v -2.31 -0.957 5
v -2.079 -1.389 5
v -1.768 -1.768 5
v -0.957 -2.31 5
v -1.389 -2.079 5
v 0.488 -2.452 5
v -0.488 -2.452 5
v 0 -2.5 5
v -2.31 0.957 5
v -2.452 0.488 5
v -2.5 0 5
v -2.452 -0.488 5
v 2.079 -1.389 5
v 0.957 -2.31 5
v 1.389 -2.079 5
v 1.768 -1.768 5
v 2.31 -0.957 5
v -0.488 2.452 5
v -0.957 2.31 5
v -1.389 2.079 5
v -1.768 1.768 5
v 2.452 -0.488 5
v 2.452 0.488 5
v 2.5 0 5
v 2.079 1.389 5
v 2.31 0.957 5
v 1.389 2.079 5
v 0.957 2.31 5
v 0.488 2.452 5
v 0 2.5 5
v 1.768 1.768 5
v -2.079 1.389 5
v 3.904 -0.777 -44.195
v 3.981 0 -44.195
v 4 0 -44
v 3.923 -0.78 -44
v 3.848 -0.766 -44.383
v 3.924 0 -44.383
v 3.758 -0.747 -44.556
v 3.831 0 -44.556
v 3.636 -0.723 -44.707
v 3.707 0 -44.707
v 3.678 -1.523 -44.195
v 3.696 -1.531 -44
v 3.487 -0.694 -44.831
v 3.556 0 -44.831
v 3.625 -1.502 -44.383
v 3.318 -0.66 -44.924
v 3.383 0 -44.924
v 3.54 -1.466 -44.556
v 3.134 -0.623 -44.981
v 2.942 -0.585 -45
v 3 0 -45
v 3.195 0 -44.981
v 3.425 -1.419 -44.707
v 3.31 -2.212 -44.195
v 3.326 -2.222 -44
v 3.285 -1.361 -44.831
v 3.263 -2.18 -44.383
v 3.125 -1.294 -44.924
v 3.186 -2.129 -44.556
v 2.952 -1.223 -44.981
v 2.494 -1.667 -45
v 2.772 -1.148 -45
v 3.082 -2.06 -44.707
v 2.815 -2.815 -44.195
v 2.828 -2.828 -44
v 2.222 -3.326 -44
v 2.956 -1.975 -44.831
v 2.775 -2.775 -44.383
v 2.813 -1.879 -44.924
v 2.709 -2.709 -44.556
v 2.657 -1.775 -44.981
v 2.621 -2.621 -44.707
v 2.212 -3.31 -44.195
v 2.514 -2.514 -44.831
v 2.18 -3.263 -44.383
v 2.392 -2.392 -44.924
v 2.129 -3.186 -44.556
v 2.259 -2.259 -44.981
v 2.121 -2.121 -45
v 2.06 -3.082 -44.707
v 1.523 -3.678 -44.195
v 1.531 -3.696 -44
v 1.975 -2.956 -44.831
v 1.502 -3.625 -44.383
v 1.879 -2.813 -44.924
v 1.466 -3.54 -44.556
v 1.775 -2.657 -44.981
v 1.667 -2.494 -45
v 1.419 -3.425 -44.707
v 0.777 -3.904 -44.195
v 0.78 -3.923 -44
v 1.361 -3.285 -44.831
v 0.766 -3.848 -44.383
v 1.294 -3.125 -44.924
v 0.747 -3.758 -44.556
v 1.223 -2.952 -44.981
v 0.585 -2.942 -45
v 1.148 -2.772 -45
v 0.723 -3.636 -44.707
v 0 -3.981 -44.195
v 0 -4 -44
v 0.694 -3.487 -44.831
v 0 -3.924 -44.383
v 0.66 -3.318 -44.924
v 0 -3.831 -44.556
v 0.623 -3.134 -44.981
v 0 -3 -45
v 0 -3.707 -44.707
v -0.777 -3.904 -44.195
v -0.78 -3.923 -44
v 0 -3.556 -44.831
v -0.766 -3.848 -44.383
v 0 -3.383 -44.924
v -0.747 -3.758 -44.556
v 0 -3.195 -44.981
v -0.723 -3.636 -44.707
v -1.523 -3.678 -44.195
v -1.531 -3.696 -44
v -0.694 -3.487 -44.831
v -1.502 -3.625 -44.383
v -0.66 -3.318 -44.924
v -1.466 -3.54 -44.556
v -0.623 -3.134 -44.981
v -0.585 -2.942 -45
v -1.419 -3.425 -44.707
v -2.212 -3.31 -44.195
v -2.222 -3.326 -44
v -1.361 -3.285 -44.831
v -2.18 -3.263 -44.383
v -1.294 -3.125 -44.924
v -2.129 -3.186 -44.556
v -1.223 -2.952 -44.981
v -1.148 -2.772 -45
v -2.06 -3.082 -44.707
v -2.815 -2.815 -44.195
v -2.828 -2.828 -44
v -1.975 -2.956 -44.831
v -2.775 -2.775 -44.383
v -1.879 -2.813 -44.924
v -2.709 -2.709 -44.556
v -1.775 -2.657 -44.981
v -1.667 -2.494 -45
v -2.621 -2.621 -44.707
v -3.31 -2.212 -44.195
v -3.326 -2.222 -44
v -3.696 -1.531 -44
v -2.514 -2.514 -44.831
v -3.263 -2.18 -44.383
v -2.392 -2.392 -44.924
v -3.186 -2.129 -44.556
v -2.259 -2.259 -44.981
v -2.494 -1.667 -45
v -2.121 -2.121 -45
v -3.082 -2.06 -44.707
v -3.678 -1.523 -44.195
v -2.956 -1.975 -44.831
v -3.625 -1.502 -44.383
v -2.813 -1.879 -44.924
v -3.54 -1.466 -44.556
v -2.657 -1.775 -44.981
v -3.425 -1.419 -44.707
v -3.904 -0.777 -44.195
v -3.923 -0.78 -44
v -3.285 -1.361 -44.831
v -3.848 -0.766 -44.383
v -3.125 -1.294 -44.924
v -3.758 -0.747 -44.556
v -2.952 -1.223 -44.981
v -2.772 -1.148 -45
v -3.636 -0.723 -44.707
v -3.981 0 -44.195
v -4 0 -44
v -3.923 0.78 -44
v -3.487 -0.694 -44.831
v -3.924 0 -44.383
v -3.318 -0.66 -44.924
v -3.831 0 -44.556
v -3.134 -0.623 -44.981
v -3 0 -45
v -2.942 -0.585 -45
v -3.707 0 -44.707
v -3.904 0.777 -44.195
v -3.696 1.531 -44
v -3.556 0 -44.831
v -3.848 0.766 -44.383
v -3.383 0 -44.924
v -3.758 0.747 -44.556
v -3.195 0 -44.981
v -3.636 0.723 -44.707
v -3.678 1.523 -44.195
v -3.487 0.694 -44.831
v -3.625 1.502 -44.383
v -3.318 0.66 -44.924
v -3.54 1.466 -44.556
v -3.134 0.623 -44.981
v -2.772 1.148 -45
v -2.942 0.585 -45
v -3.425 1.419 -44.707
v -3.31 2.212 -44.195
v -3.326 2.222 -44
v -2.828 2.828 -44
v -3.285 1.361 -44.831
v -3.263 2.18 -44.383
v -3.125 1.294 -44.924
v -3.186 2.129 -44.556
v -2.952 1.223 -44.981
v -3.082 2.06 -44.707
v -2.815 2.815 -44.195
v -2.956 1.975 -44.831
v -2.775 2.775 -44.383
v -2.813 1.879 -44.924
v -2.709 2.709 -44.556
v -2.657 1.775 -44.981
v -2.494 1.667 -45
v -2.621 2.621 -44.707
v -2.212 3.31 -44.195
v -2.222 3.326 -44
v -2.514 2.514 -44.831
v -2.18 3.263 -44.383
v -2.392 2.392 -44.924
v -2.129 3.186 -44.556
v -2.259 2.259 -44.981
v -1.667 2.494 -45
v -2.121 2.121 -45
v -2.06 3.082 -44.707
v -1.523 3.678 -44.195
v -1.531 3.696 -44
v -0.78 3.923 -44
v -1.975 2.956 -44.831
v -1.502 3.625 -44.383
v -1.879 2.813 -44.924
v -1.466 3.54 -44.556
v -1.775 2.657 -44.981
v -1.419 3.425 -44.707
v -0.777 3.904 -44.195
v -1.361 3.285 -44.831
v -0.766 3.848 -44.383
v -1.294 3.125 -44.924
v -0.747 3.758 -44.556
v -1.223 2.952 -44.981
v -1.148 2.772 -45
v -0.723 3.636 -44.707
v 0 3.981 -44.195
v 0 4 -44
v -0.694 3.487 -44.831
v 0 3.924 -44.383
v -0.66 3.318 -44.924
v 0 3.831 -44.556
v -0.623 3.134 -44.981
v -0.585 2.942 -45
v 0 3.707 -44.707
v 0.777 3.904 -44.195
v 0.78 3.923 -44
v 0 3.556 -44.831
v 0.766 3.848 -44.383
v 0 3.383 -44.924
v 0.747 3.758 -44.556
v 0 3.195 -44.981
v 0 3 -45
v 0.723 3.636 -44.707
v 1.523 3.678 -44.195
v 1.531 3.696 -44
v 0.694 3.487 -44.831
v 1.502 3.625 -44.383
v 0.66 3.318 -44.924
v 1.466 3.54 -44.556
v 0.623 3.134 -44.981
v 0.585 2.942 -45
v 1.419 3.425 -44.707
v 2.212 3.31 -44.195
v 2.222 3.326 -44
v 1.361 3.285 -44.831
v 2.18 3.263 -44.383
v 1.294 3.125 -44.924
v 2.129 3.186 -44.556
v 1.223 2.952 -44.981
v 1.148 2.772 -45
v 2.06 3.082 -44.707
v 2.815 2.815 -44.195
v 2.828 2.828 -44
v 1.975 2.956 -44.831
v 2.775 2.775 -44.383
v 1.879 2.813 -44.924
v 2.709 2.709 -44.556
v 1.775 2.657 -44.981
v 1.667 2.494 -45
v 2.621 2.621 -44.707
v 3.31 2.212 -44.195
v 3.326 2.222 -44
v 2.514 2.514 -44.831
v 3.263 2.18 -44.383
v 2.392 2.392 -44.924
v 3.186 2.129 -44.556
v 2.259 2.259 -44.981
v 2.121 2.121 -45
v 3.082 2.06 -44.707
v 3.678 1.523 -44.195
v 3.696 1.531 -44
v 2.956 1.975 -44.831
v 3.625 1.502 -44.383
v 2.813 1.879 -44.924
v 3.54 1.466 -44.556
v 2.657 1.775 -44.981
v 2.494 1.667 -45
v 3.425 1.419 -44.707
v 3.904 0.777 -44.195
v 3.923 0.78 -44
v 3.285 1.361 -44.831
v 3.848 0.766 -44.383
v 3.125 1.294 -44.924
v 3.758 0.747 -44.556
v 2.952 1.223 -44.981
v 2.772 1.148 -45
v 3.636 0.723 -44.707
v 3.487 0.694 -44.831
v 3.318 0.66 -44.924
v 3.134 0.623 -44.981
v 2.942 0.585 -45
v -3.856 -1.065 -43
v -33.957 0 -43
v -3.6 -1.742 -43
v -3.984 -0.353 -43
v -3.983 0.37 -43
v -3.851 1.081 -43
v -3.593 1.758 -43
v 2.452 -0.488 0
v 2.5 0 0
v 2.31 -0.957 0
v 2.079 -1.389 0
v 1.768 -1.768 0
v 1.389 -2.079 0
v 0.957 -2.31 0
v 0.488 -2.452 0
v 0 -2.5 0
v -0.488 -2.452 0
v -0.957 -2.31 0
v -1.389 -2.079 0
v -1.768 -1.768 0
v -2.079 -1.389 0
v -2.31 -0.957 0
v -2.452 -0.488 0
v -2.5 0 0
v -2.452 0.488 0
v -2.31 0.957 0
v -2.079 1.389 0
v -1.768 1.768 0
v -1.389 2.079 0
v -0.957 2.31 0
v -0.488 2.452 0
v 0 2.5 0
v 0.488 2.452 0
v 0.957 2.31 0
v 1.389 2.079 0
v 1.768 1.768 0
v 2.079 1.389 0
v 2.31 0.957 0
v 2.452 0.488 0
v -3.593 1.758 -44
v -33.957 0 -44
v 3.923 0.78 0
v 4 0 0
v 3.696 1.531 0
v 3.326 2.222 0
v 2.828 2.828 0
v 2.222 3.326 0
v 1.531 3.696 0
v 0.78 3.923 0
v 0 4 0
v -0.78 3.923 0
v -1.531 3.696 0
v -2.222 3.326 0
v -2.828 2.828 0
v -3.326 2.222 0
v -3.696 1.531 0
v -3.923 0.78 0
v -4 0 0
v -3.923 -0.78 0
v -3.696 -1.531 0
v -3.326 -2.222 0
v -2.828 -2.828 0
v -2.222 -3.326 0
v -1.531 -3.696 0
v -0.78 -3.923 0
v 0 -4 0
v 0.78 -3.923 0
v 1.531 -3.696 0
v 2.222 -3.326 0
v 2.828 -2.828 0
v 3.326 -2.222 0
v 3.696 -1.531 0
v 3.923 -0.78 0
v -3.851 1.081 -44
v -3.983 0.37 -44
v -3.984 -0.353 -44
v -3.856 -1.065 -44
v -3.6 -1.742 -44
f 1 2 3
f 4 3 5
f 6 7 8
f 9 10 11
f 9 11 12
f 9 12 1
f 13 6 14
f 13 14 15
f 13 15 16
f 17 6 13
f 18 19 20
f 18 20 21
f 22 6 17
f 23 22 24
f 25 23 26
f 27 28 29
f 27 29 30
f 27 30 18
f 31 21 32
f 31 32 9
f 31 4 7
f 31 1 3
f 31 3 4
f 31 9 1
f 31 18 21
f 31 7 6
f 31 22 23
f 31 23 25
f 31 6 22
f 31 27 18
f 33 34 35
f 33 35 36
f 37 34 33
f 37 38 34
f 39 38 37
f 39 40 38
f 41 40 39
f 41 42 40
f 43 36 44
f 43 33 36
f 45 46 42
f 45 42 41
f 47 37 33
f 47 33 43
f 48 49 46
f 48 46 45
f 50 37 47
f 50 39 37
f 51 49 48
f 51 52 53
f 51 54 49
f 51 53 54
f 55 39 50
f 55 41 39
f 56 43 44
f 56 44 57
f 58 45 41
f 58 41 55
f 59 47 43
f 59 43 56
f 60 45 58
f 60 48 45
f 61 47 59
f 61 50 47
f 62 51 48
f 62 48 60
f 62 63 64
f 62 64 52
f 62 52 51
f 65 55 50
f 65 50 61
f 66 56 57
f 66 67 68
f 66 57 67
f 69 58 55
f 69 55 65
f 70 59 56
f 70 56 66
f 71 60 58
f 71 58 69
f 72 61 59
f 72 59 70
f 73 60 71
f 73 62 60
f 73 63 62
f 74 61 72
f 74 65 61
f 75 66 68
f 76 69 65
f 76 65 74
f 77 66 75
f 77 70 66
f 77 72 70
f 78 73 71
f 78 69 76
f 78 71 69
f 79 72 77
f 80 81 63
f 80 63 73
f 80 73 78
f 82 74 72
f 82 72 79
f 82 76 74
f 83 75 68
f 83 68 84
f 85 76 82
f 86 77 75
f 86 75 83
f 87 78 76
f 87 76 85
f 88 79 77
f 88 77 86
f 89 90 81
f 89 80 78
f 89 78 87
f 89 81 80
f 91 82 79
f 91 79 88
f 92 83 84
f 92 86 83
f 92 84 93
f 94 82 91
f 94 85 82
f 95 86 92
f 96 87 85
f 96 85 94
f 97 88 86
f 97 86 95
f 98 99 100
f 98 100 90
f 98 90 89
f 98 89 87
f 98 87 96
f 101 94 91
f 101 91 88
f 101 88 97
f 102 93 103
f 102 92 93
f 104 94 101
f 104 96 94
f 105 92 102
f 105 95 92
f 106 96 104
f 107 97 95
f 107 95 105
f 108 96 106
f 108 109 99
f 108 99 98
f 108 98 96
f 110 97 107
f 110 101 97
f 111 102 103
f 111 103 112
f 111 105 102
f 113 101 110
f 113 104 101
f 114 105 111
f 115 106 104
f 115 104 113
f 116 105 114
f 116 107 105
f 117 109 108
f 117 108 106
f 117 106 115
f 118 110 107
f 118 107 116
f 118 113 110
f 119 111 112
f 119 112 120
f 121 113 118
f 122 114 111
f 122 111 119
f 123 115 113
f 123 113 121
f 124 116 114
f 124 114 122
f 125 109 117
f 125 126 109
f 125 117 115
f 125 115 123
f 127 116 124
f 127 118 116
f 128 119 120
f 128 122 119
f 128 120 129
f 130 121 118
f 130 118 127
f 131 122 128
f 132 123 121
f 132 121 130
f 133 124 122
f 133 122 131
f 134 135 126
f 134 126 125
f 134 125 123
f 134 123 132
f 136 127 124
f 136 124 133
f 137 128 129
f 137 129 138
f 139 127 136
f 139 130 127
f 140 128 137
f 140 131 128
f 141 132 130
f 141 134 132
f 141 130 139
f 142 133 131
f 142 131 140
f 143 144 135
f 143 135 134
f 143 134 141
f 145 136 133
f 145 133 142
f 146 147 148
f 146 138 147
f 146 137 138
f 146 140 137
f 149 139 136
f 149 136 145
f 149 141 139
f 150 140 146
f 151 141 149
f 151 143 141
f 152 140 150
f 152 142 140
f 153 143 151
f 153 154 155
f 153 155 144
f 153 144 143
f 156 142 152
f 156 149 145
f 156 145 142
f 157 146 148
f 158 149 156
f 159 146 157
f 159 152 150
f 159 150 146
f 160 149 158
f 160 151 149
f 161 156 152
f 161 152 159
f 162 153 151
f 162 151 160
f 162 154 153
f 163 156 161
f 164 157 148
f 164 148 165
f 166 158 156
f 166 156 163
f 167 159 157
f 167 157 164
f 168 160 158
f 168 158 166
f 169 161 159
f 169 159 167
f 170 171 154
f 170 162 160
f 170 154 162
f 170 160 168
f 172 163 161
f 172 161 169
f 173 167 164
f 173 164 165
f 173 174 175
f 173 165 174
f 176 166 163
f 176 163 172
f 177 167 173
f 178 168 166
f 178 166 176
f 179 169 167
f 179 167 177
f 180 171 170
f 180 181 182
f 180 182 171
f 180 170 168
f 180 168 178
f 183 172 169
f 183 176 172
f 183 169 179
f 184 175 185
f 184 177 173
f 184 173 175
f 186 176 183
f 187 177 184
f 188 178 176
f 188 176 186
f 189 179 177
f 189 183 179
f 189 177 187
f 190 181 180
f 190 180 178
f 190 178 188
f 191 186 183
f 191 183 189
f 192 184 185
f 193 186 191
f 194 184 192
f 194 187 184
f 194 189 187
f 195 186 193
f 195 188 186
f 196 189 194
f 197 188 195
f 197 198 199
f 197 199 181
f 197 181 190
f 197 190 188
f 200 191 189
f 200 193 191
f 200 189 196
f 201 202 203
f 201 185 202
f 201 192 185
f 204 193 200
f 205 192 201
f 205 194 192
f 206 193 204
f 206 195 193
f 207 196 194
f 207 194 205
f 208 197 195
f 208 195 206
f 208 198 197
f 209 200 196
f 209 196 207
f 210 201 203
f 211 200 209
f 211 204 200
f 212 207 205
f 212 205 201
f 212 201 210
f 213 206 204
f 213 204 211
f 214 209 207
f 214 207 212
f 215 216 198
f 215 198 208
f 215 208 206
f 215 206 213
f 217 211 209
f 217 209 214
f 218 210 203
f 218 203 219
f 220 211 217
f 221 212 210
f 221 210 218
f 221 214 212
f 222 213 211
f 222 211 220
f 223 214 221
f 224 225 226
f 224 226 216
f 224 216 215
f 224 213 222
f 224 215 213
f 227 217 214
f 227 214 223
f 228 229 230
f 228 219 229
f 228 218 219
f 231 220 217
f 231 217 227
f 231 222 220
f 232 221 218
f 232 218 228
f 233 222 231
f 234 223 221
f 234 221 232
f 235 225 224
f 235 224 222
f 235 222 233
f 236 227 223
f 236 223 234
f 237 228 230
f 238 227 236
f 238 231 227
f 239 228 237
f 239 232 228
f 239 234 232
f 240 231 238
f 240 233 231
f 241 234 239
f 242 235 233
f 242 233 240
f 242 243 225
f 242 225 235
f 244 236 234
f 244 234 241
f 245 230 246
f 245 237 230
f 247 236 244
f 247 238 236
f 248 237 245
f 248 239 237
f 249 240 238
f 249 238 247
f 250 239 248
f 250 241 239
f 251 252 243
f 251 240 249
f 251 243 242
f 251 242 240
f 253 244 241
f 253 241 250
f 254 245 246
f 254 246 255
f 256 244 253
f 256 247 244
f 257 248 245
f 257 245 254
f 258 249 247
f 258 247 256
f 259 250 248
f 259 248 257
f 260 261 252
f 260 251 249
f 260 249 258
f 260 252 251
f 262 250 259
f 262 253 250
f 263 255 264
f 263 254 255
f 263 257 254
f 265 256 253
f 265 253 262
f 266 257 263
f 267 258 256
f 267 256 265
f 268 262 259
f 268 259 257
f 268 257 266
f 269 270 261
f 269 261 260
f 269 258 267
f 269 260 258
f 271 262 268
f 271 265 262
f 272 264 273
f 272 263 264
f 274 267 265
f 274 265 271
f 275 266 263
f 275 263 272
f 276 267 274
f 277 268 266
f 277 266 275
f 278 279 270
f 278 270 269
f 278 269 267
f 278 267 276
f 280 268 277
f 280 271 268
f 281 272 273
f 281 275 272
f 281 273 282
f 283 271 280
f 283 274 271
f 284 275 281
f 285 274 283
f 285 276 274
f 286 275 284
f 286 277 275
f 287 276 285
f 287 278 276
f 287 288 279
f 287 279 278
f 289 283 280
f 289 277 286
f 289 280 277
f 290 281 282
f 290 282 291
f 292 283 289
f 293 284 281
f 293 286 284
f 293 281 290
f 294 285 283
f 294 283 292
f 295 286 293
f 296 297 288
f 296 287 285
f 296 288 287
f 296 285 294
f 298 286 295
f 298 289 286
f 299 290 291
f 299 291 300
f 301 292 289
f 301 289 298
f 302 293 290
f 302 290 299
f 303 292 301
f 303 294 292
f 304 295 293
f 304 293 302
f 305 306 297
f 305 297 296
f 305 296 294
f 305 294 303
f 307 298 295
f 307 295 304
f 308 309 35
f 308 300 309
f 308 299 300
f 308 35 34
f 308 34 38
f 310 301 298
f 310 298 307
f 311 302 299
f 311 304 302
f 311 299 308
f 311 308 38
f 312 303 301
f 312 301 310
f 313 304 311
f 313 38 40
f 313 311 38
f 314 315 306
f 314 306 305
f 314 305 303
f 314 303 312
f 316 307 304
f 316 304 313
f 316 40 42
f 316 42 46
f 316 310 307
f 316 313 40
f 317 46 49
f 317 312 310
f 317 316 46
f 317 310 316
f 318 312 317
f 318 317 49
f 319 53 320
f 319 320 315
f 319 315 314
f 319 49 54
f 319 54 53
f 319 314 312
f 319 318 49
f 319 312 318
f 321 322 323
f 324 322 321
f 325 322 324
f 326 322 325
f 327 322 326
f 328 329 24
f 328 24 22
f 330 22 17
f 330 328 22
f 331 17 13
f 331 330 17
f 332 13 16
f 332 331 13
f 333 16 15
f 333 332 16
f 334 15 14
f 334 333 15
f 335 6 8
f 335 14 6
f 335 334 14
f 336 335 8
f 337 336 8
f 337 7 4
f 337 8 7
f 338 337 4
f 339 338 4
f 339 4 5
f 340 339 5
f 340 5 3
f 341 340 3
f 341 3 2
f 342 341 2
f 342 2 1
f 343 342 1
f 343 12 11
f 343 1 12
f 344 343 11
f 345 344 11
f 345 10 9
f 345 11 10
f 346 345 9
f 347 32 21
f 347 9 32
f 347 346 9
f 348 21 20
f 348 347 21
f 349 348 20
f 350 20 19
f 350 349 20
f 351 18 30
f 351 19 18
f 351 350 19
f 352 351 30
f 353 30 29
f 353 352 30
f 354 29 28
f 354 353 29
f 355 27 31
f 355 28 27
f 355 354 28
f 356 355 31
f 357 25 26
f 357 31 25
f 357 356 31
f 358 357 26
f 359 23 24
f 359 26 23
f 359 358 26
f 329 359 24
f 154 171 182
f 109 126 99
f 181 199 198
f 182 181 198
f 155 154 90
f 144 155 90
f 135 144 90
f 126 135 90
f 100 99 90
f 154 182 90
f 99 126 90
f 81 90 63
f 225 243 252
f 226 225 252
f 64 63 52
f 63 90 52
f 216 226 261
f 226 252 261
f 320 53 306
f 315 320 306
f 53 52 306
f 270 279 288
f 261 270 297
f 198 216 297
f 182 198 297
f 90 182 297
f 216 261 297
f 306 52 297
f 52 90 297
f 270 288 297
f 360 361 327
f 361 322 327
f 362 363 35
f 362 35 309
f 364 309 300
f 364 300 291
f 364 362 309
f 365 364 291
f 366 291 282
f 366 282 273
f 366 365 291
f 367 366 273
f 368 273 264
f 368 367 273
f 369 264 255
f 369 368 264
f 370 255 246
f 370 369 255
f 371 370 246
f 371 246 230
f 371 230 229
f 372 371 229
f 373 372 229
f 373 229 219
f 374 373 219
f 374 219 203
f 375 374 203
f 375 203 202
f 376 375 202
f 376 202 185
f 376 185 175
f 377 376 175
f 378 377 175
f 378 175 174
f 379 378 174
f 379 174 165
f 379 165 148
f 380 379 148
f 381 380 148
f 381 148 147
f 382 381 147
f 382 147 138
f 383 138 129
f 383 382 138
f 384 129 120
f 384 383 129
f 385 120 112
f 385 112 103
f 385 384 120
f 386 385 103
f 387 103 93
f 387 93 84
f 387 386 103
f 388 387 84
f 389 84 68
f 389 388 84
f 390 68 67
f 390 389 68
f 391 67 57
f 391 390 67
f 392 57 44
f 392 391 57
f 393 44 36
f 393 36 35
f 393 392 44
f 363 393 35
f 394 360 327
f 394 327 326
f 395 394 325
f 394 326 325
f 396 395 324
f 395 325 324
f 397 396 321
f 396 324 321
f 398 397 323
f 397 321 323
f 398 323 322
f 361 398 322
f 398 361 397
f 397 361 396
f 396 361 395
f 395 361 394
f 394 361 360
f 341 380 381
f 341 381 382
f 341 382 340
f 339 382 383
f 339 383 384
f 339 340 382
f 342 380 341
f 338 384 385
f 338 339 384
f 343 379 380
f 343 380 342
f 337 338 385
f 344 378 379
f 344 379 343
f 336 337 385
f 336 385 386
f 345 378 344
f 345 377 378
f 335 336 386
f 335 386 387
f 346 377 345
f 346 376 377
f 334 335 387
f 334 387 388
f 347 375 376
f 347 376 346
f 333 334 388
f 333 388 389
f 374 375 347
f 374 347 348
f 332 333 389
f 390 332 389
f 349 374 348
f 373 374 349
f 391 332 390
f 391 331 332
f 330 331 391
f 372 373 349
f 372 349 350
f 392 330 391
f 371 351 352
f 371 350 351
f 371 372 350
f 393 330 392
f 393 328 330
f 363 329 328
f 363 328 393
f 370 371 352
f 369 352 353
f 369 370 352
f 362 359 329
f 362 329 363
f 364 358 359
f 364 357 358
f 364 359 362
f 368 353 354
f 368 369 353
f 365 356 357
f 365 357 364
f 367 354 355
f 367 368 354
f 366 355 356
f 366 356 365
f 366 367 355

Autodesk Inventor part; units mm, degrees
ref_plane "YZ Plane" through (0, 0, 0) normal (1, 0, 0) x (0, 1, 0)
ref_plane "XZ Plane" through (0, 0, 0) normal (0, 1, 0) x (-1, 0, 0)
sketch "Sketch1" plane through (0, 0, 0) normal (0, 0, 1) x (1, 0, 0)
  circle A0 centre (0, 0) radius 4
  circle A1 centre (0, 0) radius 2.5
  dimension "d0" = 8
  dimension "d19" = 5
extrude "Extrusion4" add sketch "Sketch1" against normal blind 40 contours A0 | A1
extrude "Extrusion5" add sketch "Sketch1" against normal blind 45 contours A0 | A1
extrude "Extrusion6" add sketch "Sketch1" along normal blind 5 contours A1
ref_plane "Work Plane1" through (0, 0, -43) normal (0, 0, 1) x (1, 0, 0)
sketch "Sketch2" plane through (0, 0, -43) normal (0, 0, 1) x (1, 0, 0)
  circle A0 centre (0, 0) radius 4
  line L0 (-2.5, 2.5) -> (-2.5, -2.5)
  line L1 (-2.5, -2.5) -> (2.5, -2.5)
  line L2 (2.5, -2.5) -> (2.5, 2.5)
  line L3 (2.5, 2.5) -> (-2.5, 2.5)
  circle A1 centre (0, 0) radius 4
  line L4 (-3.6005, -1.7425) -> (-33.9574, 0)
  line L5 (-33.9574, 0) -> (-3.5932, 1.7575)
  line L6 (0, 0) -> (-33.6177, 0.0197) construction
  arc A2 (-3.5922, 1.7597) -> (-3.6005, -1.7425) centre (0.4698, -0.0011) ccw
  circle A3 centre (0, 0) radius 4
  circle A4 centre (0, 0) radius 4
  point P0 (-3.9574, 0.0094)
  point P1 (-3.5932, 1.7575)
  dimension "d9" = 30
  dimension "d10" = 3.5
extrude "Extrusion3" add sketch "Sketch2" against normal blind 1 separate body contours L4 L5 A0
fillet "Fillet2" radius 1 1 edges at (-4, 0, -45)
properties part number "202 part 3"
